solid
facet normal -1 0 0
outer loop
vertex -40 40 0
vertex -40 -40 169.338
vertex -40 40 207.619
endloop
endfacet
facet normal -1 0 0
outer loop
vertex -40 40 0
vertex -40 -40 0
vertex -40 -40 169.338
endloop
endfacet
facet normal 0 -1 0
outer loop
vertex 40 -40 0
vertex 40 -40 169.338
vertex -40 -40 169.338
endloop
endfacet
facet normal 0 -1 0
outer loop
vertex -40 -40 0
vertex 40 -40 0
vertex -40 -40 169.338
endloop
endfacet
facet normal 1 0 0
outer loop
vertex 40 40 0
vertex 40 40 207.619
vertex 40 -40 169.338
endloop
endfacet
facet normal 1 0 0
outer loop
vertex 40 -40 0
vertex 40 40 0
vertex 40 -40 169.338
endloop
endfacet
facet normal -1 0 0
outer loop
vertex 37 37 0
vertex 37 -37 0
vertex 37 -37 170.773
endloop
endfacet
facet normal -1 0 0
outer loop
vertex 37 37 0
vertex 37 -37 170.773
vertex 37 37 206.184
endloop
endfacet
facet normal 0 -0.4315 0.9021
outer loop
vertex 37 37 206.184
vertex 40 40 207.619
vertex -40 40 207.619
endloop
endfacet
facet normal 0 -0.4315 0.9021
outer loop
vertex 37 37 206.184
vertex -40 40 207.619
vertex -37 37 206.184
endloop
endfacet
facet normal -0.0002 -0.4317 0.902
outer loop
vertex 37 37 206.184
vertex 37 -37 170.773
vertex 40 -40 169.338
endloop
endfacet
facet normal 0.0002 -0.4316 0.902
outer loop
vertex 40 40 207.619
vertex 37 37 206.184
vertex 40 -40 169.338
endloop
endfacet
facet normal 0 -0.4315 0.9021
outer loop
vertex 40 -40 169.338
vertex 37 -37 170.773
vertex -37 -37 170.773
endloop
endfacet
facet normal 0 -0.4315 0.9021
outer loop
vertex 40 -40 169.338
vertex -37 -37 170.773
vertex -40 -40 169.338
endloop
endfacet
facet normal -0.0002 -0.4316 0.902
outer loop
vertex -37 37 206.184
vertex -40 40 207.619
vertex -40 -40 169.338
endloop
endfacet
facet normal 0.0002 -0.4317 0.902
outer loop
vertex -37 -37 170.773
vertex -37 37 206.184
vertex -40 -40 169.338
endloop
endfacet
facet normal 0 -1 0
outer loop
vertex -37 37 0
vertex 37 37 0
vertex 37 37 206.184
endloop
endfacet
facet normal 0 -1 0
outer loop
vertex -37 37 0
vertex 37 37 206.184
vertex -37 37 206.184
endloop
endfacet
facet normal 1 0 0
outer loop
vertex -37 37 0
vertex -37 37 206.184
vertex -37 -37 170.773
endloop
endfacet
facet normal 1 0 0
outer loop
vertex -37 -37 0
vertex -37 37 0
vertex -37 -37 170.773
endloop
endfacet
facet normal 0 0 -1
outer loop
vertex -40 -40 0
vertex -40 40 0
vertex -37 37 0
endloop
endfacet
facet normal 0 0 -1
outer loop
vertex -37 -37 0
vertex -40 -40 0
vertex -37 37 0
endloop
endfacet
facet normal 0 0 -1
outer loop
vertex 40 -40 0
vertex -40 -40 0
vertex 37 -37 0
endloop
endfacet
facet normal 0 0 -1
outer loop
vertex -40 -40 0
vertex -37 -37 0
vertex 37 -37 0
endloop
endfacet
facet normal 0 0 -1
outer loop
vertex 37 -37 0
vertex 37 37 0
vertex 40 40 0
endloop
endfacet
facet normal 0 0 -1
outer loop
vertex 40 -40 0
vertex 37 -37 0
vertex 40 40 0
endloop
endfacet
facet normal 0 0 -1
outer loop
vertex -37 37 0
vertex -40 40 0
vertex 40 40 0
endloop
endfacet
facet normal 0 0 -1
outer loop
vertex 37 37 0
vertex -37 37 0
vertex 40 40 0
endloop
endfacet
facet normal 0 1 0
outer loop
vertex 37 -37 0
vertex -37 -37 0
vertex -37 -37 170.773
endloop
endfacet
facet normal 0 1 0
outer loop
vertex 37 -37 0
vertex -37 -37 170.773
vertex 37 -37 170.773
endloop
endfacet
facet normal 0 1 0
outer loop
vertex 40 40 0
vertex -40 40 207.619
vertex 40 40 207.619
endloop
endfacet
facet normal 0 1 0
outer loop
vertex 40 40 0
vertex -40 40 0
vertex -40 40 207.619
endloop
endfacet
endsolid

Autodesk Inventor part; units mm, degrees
ref_plane "YZ Plane" through (0, 0, 0) normal (1, 0, 0) x (0, 1, 0)
ref_plane "XZ Plane" through (0, 0, 0) normal (0, 1, 0) x (-1, 0, 0)
ref_plane "XY Plane" through (0, 0, 0) normal (0, 0, 1) x (1, 0, 0)
sketch "Sketch1" plane through (0, 0, 0) normal (0, 0, 1) x (1, 0, 0)
  line L0 (40, -40) -> (-40, -40)
  line L1 (-40, -40) -> (-40, 40)
  line L2 (-40, 40) -> (40, 40)
  line L3 (40, 40) -> (40, -40)
  line L4 (40, -40) -> (-40, 40) construction
  line L5 (-40, -40) -> (40, 40) construction
  line L6 (-37, -37) -> (37, -37)
  line L7 (37, -37) -> (37, 37)
  line L8 (37, 37) -> (-37, 37)
  line L9 (-37, 37) -> (-37, -37)
  point P0 (0, 0)
  dimension "d0" = 80
  dimension "d1" = 80
  dimension "d2" = 3
extrude "Extrusion1" add sketch "Sketch1" along normal blind 207.6194
sketch "Sketch2" plane through (0, 0, 0) normal (1, 0, 0) x (0, 1, 0)
  line L0 (40, 0) -> (-40, 0) projected
  line L1 (-40, 0) -> (-40, 207.6194) projected
  line L2 (40, 207.6194) -> (-40, 207.6194) projected
  line L3 (40, 0) -> (40, 207.6194) projected
  line L4 (40, 207.6194) -> (-40, 169.3378)
  point P0 (0, 0)
  dimension "d5" = 25.572
extrude "Extrusion2" cut sketch "Sketch2" along normal through all both and the other way through all contours L4 L1 L2
equation "\"d3\" = Lenth"
equation "\"d5\" = Leg_cut_angle"
equation "\"Lenth\" = Leg_hight"
equation "\"Leg_cut_angle\" = 25.57201deg"
equation "\"Leg_hight\" = 207.619385"
properties part number "TZS 0984 leg tube"
